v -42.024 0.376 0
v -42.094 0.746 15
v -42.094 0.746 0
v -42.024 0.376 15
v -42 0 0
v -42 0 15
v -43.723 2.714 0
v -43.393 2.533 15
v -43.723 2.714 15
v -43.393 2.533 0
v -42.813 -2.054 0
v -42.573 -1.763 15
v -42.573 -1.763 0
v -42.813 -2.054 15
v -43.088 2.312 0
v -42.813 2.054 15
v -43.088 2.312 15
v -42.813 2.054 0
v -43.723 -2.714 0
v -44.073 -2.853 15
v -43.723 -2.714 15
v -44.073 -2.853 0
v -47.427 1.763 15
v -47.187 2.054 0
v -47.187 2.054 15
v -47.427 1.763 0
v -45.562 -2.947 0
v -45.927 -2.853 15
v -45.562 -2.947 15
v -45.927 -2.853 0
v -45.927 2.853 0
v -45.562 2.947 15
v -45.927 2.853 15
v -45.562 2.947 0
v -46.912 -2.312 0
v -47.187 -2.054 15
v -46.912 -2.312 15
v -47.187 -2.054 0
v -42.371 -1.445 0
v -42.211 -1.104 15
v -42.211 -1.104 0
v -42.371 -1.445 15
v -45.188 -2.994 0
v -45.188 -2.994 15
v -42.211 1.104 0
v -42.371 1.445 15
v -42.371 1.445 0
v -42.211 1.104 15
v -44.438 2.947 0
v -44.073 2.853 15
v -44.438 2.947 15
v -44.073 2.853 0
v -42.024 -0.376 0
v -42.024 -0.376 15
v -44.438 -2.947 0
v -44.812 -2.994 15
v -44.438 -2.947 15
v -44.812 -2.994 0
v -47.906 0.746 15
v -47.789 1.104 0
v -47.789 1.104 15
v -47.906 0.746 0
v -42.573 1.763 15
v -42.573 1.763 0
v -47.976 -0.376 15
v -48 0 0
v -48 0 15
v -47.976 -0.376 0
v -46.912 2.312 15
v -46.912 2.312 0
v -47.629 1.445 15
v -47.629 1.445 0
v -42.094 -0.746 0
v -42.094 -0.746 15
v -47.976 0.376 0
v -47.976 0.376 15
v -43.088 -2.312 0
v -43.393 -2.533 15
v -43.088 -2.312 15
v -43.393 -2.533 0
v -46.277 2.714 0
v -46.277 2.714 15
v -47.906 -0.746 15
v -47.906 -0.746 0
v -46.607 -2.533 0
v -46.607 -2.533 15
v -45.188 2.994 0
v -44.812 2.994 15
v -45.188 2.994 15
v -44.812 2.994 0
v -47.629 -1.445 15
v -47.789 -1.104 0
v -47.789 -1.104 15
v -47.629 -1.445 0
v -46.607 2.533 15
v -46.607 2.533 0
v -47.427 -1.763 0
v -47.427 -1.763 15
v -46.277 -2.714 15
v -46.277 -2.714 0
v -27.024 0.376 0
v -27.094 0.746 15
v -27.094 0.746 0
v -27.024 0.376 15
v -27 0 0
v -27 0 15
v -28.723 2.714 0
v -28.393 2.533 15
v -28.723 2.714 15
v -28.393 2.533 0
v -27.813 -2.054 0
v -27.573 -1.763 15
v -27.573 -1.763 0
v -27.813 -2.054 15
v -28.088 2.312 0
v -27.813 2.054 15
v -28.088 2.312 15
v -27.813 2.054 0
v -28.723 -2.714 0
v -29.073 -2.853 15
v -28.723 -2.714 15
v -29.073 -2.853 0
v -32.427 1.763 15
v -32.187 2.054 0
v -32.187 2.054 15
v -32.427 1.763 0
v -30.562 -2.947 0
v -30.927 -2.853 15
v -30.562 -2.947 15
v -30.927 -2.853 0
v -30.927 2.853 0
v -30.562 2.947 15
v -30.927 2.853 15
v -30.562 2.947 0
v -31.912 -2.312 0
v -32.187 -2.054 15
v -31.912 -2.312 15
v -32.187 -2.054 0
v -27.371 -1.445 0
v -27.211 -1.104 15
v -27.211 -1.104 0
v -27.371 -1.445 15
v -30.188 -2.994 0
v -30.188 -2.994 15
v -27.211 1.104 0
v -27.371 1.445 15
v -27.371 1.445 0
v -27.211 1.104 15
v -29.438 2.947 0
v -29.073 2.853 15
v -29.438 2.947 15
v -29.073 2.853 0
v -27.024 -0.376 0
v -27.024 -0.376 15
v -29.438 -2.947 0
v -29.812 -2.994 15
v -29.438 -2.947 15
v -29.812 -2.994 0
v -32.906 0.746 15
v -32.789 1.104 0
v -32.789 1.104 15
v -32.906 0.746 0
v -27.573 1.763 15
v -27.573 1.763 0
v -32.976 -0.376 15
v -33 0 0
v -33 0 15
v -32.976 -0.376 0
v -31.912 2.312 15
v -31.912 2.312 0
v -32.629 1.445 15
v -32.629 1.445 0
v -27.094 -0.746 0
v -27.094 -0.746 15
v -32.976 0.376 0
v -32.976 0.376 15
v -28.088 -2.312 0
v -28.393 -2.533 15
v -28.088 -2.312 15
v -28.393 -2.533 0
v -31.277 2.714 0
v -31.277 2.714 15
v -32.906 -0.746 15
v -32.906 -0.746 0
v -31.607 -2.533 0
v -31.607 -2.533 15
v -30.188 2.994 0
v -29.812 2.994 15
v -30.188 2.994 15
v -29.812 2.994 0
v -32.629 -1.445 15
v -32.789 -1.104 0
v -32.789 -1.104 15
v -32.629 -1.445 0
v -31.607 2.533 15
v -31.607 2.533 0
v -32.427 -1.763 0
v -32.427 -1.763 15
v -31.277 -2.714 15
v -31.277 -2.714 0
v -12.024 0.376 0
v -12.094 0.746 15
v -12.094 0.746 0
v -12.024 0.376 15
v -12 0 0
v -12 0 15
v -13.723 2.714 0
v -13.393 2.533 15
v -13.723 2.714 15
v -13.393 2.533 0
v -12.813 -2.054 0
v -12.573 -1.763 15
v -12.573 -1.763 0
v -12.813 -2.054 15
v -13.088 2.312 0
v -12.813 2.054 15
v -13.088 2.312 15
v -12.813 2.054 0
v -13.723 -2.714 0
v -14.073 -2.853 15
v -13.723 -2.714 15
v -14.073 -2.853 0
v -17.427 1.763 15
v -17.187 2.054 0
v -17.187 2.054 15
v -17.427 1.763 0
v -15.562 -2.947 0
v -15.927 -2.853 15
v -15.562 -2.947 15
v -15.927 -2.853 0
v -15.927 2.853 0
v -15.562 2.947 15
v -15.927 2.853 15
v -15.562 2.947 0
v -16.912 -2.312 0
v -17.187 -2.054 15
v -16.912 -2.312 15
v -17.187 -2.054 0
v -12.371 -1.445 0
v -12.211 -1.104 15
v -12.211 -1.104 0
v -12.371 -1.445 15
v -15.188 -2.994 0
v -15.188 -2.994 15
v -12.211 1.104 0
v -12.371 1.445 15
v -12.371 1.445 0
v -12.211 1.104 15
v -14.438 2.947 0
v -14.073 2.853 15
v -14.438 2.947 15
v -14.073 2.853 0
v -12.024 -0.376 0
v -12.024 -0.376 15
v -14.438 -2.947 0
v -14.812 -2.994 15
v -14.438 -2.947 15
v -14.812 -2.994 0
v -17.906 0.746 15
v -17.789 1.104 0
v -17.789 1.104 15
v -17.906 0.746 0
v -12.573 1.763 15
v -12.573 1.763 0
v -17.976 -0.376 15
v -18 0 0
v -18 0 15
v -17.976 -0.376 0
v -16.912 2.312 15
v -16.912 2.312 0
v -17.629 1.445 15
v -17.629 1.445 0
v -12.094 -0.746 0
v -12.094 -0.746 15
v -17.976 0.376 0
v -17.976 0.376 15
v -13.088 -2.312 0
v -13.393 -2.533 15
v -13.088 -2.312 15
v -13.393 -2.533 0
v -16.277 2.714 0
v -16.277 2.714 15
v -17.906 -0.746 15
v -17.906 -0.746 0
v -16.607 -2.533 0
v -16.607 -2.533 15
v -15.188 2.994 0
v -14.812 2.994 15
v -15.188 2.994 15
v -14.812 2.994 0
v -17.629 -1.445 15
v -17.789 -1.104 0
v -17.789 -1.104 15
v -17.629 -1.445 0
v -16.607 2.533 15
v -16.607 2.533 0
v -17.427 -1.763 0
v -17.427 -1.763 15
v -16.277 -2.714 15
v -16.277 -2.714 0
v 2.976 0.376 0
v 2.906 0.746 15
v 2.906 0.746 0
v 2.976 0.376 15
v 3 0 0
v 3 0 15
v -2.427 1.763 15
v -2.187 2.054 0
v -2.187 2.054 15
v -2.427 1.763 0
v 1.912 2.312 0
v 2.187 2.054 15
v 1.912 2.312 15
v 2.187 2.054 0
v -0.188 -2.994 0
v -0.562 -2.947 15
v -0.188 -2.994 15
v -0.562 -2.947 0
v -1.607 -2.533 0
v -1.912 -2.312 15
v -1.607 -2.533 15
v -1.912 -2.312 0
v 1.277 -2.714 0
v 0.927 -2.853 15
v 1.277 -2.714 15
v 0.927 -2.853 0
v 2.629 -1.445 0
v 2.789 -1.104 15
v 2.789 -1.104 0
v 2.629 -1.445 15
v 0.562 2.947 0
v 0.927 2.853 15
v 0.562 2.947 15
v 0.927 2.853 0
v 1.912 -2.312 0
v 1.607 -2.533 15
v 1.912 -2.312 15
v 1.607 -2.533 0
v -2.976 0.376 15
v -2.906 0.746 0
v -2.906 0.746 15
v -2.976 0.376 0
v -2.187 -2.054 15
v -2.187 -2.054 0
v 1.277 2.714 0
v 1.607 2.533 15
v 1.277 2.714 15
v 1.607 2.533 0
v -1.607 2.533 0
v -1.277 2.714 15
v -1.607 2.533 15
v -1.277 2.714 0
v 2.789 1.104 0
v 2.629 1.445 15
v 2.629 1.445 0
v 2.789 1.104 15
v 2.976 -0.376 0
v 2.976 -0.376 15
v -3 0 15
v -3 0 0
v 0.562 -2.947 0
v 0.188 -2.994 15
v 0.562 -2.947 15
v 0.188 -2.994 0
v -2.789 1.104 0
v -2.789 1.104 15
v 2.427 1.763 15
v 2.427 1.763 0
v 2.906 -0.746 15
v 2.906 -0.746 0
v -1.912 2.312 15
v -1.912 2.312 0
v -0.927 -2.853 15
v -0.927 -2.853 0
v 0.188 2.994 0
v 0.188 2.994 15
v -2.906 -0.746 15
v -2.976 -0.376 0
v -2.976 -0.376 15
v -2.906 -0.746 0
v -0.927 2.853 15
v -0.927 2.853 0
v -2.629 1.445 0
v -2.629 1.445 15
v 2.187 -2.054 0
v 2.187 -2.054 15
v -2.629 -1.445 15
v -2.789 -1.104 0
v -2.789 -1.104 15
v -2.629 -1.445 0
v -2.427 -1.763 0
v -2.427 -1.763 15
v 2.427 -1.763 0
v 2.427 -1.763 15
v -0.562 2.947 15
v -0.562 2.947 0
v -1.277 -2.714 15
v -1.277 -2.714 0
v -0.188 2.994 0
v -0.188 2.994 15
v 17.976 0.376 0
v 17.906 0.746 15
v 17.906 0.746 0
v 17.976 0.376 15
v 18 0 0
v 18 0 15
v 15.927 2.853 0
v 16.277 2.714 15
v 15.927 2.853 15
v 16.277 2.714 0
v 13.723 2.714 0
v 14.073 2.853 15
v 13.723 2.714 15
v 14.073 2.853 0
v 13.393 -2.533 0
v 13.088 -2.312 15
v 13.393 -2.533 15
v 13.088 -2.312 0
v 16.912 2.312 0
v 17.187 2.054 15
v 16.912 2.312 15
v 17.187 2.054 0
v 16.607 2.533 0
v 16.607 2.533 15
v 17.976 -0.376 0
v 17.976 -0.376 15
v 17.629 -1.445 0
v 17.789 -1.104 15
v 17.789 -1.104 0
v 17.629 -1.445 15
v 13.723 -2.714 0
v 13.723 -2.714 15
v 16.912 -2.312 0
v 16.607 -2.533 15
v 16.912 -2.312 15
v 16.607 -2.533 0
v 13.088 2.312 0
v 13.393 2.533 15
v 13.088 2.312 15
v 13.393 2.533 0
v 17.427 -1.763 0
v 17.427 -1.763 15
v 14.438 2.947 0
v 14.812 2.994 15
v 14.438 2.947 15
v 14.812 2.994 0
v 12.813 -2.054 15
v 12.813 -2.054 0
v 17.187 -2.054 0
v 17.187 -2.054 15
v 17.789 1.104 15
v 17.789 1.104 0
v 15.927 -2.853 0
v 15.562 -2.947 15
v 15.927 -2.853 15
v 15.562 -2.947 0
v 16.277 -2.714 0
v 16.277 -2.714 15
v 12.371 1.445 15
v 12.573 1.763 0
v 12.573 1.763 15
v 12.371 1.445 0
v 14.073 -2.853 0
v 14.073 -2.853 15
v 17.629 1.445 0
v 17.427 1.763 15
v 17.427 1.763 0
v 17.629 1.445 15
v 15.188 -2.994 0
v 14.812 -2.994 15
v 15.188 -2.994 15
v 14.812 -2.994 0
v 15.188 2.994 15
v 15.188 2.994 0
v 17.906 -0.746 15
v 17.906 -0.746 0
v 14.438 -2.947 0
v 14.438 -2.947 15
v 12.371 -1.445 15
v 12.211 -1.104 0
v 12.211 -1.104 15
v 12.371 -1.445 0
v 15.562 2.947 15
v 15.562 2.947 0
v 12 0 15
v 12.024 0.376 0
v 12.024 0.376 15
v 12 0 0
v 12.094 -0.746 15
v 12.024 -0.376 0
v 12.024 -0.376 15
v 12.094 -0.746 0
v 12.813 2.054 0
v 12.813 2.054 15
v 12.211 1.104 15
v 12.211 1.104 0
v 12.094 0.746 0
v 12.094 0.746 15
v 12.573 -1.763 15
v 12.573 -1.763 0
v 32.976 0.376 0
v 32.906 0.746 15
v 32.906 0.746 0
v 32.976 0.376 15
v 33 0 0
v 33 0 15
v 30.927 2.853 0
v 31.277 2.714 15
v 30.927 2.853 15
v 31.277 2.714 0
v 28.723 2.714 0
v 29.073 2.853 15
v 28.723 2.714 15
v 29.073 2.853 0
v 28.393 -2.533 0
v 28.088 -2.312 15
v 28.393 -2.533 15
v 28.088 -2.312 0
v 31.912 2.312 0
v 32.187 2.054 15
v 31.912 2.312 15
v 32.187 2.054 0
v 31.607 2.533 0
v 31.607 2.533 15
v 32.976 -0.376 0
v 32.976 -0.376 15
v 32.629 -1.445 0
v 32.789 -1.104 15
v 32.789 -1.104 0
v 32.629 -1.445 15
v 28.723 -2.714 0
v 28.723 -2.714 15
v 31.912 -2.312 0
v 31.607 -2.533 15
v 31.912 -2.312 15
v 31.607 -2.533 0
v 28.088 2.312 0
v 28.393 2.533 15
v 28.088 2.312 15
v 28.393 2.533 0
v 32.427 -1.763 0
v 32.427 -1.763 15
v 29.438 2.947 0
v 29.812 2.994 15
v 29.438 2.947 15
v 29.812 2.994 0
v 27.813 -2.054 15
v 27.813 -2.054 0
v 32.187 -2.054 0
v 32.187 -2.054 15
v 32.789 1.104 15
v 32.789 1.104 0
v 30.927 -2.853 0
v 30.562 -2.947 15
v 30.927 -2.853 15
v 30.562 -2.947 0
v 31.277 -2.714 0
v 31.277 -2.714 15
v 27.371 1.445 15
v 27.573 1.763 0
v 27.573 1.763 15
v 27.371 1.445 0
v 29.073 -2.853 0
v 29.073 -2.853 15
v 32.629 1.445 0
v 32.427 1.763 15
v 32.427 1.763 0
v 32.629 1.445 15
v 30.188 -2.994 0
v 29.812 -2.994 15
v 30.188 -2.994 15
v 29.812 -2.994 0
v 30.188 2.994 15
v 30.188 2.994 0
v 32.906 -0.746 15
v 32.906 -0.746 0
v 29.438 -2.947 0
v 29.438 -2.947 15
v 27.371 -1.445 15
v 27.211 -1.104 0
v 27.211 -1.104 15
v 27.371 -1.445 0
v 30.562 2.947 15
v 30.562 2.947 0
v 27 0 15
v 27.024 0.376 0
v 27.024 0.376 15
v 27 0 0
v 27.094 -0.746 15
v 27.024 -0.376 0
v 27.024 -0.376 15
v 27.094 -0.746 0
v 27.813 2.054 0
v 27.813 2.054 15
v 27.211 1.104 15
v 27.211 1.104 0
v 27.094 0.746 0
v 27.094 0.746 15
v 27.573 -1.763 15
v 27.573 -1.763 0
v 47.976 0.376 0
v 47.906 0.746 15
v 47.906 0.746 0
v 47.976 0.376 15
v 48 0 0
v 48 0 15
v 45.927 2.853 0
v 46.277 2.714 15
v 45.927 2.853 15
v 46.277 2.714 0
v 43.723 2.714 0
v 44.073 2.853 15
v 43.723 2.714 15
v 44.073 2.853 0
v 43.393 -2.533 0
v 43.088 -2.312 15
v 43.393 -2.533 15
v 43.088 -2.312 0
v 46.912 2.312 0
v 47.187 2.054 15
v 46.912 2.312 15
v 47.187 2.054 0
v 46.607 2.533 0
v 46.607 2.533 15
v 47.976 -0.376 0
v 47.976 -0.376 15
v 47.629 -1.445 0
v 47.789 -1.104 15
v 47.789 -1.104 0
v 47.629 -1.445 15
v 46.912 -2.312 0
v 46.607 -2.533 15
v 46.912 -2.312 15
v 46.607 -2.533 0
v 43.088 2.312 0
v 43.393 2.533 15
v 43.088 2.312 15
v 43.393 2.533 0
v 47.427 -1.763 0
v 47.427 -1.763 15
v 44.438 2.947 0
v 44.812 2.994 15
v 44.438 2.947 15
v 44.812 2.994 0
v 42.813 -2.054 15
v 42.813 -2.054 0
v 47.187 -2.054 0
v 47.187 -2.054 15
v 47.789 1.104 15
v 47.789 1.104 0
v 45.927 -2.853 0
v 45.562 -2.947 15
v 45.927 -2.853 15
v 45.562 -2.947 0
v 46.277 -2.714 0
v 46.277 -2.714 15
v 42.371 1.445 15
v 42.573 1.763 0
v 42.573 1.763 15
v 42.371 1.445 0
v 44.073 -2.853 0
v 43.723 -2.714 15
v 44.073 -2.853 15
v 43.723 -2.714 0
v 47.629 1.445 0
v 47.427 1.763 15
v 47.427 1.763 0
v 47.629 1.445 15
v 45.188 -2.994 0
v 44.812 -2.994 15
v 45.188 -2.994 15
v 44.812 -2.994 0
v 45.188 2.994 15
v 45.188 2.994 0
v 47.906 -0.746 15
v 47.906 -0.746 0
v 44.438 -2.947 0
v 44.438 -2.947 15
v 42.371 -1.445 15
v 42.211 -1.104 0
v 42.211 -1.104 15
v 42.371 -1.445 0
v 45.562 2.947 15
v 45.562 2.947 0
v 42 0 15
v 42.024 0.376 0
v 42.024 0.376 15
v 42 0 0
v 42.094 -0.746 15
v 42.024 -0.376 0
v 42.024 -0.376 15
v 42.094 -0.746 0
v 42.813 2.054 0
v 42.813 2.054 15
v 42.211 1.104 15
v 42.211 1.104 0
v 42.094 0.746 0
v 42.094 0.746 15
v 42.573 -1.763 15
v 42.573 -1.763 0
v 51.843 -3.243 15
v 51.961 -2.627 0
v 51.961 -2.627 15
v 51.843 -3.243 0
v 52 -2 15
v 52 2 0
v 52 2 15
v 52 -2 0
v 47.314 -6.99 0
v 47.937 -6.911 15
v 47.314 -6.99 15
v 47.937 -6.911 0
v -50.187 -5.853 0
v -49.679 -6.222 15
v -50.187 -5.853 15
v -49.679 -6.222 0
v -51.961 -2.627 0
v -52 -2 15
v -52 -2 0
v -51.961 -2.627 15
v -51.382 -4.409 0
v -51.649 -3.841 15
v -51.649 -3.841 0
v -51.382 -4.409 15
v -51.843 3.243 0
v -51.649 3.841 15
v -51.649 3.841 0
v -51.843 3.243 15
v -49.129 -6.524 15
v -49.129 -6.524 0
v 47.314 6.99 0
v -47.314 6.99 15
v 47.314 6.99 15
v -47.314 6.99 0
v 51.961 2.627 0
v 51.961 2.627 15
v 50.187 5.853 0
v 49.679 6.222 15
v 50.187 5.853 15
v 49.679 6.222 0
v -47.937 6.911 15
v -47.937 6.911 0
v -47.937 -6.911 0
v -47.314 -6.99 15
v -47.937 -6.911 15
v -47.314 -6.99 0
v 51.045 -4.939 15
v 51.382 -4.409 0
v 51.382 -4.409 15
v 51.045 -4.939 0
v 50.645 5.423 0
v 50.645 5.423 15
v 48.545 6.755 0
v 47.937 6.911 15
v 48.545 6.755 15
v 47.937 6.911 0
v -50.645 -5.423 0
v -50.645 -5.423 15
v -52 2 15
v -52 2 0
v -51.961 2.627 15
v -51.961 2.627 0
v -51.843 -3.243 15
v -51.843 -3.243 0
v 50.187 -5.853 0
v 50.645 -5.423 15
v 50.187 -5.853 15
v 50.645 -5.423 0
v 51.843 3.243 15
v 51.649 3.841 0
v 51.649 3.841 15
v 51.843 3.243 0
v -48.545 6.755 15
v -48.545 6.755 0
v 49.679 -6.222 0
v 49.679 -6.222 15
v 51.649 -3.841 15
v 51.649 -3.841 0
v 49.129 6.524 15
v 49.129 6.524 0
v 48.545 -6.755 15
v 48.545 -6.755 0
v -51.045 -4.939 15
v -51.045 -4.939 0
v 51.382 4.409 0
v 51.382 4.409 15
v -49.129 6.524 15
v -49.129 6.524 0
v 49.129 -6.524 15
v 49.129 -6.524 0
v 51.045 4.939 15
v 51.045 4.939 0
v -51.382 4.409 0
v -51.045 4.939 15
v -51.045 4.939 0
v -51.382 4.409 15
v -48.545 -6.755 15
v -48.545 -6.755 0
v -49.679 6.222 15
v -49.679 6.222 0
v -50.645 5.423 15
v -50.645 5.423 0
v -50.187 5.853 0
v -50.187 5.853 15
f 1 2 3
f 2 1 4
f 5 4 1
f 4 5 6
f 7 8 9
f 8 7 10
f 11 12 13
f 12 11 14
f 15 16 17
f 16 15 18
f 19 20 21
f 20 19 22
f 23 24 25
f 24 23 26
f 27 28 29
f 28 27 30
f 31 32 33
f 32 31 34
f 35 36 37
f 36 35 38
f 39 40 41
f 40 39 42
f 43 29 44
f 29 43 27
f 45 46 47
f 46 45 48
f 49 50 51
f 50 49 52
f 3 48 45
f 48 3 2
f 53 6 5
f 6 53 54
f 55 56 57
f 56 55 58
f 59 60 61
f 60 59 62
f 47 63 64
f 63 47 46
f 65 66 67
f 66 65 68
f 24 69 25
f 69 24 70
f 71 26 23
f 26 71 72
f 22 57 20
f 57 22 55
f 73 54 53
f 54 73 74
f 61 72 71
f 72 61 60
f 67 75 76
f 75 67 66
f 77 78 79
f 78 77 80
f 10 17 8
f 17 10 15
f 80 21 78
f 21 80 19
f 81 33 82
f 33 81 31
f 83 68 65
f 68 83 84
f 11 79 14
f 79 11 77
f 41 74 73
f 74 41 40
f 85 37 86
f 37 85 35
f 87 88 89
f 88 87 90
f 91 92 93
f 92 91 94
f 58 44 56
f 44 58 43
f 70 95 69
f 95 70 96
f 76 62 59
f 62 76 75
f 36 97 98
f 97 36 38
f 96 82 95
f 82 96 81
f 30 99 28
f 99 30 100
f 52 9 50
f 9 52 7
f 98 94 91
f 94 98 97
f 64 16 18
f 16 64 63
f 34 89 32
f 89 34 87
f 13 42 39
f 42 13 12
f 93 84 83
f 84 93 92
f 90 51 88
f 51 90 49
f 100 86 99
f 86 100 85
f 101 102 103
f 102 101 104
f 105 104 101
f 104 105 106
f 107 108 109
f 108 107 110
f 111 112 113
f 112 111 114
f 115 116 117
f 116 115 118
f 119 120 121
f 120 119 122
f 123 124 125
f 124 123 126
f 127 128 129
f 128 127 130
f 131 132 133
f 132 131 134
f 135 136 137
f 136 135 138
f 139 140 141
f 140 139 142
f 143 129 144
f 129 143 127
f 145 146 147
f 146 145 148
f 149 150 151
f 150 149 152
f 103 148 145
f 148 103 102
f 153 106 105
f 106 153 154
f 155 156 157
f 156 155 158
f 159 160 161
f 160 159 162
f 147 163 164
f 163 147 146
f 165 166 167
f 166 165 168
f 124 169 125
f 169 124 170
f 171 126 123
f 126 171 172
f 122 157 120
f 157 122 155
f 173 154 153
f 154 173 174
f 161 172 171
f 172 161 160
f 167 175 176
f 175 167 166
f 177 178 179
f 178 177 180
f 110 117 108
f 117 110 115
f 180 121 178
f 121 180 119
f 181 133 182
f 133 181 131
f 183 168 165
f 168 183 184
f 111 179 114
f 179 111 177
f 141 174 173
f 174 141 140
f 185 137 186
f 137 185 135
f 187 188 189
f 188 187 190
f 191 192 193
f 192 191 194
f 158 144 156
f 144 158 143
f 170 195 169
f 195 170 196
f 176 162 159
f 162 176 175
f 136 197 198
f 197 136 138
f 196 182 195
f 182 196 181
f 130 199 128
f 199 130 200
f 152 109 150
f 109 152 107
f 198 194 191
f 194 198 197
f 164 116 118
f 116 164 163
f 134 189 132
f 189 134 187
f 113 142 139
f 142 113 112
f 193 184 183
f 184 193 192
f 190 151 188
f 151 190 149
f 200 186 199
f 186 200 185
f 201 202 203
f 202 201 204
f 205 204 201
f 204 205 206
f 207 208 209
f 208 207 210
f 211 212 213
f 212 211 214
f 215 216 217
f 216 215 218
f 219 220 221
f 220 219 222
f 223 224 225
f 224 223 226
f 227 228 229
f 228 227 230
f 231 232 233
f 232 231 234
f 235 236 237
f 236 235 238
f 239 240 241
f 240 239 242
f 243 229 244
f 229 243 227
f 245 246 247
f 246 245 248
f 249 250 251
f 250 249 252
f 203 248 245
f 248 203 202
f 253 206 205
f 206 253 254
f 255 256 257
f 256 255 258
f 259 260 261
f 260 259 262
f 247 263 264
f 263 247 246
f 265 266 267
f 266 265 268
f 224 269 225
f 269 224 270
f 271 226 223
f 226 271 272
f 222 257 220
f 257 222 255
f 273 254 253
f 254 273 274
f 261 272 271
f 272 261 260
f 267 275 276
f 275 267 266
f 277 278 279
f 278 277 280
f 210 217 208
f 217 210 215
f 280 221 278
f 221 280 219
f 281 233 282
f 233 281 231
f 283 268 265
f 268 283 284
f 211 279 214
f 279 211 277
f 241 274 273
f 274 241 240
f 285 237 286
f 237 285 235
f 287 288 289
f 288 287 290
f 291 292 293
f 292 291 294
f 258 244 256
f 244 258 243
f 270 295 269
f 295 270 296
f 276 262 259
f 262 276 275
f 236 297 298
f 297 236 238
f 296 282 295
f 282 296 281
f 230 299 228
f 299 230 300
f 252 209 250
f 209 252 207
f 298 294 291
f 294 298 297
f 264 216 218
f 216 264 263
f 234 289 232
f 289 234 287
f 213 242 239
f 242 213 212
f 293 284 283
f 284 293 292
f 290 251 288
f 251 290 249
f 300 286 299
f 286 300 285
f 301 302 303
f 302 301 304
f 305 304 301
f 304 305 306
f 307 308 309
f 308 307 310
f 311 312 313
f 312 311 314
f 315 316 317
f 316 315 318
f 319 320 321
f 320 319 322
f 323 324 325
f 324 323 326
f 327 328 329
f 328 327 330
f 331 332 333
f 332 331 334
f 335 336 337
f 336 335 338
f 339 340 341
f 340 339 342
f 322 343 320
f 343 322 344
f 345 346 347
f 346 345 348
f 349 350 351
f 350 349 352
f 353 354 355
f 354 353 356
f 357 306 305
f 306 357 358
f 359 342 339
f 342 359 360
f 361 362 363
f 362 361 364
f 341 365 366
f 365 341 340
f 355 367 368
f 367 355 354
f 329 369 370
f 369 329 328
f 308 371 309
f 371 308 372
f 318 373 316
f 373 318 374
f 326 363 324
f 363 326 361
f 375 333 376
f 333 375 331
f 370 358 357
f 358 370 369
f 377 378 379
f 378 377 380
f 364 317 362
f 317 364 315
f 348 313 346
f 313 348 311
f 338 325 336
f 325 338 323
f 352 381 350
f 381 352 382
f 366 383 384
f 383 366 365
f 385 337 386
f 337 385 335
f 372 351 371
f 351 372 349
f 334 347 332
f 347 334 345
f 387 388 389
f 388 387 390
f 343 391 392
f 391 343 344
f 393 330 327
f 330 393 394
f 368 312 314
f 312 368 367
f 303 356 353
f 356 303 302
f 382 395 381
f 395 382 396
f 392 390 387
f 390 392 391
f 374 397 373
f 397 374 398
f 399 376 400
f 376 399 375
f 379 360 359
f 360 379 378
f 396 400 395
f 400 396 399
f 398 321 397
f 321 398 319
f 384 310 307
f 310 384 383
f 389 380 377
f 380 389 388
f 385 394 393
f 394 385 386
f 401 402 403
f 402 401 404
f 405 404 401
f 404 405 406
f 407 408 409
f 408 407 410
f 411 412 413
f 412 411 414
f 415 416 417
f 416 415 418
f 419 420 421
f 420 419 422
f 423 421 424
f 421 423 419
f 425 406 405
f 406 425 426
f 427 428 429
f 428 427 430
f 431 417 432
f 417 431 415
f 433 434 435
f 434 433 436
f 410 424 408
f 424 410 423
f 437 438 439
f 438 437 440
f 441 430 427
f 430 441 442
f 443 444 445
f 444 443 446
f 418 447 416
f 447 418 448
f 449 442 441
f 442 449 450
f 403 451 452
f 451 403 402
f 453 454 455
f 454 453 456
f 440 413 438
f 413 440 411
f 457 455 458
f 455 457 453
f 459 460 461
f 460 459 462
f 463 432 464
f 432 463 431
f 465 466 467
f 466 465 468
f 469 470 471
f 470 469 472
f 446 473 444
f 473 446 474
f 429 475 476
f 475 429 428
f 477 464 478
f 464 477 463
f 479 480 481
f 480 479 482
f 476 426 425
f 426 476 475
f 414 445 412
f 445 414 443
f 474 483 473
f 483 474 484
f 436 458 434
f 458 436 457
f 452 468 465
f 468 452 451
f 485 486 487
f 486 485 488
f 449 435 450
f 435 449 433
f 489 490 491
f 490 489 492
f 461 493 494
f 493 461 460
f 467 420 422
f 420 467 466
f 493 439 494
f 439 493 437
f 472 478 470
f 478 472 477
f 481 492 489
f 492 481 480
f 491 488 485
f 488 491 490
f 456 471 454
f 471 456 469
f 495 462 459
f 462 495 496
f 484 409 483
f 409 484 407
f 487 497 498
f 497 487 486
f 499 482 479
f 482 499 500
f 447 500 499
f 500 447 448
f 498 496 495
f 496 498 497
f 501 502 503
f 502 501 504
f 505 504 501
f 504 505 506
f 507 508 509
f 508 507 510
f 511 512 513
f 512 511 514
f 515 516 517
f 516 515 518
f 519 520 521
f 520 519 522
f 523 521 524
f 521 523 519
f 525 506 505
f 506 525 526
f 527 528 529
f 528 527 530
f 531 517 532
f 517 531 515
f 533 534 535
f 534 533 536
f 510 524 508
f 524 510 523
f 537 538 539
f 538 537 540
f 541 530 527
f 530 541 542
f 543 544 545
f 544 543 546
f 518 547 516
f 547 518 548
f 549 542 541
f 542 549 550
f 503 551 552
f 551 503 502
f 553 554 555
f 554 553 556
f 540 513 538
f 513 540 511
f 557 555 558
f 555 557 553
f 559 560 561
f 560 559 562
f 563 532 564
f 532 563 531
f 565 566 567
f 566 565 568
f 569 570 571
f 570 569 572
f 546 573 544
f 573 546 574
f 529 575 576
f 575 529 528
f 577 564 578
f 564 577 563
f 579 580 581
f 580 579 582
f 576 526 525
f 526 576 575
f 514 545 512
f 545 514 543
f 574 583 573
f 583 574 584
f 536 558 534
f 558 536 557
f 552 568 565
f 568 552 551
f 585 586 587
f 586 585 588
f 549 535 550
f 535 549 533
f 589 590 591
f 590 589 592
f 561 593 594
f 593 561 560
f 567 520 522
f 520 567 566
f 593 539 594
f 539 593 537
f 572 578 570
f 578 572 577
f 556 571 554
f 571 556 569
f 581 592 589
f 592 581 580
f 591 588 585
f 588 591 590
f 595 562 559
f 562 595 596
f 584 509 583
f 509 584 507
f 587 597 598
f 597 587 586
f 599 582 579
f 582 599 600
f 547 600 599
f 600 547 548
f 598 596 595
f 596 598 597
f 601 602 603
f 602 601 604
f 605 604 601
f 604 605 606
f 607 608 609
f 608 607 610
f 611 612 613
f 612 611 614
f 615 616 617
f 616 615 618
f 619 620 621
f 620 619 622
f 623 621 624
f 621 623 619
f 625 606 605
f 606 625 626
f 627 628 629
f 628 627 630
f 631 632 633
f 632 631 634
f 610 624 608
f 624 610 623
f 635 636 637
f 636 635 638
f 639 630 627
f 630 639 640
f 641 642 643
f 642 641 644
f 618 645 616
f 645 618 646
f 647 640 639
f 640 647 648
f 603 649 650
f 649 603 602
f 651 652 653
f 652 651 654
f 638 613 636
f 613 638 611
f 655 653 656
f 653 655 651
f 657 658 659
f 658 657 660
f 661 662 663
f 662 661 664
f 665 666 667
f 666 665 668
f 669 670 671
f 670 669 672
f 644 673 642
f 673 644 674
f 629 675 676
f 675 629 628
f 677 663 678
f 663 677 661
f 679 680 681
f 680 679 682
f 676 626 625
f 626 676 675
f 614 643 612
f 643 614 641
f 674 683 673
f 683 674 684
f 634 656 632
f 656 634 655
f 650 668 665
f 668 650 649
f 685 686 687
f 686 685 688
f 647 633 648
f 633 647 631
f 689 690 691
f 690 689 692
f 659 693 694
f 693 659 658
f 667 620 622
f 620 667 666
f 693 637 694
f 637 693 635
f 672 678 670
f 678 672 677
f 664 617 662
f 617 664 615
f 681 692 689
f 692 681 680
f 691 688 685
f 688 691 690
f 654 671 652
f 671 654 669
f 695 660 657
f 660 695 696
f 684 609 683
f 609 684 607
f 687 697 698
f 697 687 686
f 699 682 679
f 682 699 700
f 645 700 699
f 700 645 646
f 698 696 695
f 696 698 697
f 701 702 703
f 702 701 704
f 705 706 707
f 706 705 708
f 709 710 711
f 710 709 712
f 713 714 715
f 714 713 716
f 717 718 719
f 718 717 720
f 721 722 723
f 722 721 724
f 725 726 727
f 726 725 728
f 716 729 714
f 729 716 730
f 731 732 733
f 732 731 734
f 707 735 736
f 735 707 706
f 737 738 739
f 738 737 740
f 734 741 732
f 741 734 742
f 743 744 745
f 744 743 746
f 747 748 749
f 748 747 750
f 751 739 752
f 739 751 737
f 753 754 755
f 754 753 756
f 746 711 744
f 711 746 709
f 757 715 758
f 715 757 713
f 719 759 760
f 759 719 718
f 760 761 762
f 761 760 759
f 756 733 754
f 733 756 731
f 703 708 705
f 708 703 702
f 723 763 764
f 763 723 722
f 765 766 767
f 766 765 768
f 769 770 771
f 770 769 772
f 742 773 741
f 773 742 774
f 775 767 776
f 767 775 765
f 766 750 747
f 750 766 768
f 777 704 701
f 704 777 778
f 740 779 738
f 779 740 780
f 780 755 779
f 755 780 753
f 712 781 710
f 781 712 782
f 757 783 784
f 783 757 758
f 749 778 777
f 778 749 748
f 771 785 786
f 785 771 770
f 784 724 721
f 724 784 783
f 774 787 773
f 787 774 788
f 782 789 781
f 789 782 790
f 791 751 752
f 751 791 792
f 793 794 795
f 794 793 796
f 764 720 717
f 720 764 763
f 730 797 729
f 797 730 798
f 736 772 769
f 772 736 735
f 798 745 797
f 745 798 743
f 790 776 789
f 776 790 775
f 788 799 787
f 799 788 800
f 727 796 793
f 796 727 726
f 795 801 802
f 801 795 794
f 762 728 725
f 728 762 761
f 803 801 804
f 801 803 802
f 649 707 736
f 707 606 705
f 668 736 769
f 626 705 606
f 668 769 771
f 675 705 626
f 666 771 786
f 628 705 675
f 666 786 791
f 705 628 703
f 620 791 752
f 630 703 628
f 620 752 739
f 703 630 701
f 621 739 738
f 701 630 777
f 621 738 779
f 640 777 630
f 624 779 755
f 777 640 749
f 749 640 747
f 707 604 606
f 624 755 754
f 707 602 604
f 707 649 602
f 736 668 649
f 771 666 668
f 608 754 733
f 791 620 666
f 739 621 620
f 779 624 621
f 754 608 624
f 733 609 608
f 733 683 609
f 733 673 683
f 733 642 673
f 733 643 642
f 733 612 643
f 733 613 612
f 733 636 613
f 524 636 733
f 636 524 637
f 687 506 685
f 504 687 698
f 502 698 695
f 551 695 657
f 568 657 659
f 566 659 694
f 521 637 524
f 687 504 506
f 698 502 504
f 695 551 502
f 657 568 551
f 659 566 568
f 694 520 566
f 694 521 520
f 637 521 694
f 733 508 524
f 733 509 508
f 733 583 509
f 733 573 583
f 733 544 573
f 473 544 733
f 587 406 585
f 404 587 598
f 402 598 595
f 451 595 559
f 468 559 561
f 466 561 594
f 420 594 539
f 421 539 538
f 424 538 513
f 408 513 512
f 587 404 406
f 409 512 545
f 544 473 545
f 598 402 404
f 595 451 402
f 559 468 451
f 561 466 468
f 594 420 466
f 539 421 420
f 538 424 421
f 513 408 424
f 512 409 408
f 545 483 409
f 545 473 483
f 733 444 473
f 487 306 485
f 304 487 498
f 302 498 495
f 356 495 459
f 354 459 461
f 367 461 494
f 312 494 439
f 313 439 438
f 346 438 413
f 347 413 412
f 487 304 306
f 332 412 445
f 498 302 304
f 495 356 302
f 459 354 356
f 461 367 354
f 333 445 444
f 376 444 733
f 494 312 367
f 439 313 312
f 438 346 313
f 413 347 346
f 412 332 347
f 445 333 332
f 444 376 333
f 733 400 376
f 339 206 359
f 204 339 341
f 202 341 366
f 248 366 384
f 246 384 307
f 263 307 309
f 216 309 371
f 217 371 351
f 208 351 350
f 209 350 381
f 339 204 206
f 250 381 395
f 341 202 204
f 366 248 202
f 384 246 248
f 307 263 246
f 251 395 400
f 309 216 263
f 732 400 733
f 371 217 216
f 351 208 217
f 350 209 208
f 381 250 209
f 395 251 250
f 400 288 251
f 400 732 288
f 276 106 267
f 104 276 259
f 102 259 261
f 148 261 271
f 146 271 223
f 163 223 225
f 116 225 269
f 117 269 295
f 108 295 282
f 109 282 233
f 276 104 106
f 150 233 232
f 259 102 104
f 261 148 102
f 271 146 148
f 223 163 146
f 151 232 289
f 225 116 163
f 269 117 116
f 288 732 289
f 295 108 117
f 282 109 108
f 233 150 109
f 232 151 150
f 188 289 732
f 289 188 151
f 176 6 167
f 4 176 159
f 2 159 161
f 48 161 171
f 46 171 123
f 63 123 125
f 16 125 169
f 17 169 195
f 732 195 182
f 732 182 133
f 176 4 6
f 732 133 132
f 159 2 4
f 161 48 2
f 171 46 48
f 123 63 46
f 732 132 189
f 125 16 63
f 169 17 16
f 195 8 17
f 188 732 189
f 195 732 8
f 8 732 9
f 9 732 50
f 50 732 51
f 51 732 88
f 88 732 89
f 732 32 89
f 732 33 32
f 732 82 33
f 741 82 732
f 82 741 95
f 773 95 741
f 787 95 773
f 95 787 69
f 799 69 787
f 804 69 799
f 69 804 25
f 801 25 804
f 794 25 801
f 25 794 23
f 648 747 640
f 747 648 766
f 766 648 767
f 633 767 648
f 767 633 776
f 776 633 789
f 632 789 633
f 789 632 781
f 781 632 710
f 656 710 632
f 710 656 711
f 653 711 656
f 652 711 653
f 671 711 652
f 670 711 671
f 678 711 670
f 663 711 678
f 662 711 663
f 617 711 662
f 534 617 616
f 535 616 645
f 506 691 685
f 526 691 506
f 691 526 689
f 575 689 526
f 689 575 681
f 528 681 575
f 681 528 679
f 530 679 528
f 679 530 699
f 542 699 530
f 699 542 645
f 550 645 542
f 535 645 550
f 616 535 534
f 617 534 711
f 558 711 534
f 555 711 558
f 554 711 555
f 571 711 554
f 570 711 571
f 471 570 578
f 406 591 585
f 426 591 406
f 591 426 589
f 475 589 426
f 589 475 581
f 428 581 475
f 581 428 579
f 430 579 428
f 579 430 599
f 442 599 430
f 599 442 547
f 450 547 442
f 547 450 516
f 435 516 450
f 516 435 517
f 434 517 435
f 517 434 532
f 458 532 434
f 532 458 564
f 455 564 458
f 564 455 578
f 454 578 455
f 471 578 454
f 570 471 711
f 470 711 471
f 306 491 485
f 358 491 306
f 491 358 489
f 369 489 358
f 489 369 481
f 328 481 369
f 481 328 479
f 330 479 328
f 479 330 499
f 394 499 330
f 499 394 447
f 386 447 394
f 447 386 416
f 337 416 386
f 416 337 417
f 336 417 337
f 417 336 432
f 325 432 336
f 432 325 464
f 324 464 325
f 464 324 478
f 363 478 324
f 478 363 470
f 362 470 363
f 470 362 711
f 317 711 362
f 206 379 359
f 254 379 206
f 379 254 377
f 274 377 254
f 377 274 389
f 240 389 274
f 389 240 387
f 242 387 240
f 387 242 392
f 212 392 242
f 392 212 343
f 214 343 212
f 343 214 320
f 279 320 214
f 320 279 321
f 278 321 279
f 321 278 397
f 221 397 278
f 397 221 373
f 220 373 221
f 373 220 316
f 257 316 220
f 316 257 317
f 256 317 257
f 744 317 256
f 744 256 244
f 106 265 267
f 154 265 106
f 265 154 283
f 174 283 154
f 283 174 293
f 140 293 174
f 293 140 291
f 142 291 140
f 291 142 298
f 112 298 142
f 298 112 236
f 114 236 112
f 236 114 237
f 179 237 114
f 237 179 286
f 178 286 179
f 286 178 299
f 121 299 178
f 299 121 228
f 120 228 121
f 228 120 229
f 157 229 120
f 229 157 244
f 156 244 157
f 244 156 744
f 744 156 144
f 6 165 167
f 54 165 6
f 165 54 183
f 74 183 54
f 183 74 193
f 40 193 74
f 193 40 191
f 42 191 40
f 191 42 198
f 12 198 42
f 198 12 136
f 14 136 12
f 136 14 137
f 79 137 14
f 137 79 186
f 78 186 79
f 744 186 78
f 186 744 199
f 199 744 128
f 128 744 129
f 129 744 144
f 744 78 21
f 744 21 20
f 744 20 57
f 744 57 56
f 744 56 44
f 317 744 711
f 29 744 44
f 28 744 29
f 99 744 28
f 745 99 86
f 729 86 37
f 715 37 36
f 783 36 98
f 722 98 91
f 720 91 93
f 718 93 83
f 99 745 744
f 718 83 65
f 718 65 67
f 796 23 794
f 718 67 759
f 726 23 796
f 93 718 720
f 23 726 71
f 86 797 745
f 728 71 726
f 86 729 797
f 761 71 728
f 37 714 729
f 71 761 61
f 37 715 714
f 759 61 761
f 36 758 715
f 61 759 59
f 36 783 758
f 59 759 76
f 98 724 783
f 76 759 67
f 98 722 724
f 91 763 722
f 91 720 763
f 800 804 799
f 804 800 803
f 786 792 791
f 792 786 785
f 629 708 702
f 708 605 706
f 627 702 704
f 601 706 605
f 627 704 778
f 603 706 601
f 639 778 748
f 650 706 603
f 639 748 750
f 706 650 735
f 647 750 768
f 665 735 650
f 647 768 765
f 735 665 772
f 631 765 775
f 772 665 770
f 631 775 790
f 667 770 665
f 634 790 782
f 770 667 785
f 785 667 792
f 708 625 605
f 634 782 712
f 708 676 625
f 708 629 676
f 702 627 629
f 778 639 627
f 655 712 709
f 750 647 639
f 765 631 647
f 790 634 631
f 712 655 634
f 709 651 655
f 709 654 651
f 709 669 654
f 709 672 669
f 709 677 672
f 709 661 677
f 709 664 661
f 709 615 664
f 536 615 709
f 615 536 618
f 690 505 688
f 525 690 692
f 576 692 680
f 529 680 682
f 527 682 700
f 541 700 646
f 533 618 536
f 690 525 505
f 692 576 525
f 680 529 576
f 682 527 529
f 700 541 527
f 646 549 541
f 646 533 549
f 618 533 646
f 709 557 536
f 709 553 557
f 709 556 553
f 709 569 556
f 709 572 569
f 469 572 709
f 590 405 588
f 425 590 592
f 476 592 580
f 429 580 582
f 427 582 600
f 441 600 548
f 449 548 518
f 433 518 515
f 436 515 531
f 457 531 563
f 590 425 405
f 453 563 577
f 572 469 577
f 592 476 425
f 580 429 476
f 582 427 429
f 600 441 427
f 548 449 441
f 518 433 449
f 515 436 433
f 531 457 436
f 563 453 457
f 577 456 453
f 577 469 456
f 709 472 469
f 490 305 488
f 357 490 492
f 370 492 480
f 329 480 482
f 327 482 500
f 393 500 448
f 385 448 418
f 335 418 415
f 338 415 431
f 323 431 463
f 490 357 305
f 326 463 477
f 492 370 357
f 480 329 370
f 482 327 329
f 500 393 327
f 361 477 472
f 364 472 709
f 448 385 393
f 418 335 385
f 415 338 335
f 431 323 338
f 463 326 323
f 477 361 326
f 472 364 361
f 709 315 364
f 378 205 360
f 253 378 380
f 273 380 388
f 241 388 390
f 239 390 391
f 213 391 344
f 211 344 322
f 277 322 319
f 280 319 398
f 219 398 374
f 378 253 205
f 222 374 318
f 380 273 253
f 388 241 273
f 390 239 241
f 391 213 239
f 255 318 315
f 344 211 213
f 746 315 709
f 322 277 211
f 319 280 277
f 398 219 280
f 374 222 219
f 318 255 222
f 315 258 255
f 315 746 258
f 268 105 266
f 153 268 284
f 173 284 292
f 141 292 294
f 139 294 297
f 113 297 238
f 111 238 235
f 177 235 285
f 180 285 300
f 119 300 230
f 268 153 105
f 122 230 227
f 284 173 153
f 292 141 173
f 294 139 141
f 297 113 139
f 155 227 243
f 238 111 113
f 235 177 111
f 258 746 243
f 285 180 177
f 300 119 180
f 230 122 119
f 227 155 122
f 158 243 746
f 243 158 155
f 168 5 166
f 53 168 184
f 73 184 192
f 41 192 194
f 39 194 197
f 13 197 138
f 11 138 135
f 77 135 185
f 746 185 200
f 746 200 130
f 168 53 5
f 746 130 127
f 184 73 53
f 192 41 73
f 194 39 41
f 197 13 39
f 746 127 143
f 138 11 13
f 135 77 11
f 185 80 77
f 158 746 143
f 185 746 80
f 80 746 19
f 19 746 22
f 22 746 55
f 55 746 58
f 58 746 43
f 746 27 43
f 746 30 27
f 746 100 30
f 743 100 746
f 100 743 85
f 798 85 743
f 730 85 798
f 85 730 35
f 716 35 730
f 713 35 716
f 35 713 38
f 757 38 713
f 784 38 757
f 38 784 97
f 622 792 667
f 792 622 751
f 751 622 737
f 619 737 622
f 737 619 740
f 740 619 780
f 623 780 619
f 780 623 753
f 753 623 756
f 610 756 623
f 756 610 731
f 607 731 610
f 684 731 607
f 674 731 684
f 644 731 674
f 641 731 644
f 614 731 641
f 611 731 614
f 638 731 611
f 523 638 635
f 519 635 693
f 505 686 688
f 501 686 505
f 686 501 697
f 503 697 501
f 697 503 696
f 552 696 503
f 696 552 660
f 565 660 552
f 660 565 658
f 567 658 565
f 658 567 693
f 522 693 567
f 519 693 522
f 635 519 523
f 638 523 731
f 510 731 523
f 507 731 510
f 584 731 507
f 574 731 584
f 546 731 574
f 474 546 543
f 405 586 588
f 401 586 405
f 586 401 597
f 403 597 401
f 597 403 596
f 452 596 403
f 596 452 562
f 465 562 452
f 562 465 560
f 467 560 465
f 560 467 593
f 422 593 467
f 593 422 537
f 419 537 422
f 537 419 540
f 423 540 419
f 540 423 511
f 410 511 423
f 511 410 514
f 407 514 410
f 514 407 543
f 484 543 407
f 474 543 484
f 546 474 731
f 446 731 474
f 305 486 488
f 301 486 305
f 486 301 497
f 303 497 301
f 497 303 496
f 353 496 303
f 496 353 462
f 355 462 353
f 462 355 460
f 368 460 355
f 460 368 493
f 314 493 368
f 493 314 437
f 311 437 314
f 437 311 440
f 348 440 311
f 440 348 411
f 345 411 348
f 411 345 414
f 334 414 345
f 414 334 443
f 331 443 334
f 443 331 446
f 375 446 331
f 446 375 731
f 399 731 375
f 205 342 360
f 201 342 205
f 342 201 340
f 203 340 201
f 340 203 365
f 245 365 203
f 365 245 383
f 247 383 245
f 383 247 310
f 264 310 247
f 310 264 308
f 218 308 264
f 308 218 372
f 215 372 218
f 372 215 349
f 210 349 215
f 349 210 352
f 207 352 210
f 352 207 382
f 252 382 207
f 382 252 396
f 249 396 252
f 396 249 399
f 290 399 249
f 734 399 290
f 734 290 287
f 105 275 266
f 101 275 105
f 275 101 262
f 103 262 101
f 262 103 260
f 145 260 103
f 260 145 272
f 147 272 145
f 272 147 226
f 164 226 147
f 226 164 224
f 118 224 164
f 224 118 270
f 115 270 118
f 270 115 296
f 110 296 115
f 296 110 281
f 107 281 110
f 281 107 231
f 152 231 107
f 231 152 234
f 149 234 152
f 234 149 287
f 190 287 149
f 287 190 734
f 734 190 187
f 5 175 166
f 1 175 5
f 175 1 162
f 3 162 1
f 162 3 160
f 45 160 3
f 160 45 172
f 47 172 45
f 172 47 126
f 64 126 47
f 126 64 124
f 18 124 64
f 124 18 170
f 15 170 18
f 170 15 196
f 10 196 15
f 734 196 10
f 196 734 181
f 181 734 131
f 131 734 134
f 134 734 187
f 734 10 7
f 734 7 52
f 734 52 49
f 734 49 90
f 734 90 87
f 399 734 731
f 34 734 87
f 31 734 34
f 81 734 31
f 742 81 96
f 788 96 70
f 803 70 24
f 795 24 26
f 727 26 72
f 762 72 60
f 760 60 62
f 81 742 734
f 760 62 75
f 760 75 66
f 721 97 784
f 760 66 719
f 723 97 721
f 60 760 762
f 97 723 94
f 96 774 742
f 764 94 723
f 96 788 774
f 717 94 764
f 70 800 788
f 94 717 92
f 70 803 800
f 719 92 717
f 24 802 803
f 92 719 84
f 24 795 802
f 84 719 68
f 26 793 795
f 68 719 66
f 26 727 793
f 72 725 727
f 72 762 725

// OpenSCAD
$fn = 50;


difference() {
	union() {
		hull() {
			translate(v = [-47.0000000000, 2.0000000000, 0]) {
				cylinder(h = 15, r = 5);
			}
			translate(v = [47.0000000000, 2.0000000000, 0]) {
				cylinder(h = 15, r = 5);
			}
			translate(v = [-47.0000000000, -2.0000000000, 0]) {
				cylinder(h = 15, r = 5);
			}
			translate(v = [47.0000000000, -2.0000000000, 0]) {
				cylinder(h = 15, r = 5);
			}
		}
	}
	union() {
		translate(v = [-45.0000000000, 0.0000000000, 0]) {
			translate(v = [0, 0, -100]) {
				cylinder(h = 200, r = 3.0000000000);
			}
		}
		translate(v = [-30.0000000000, 0.0000000000, 0]) {
			translate(v = [0, 0, -100]) {
				cylinder(h = 200, r = 3.0000000000);
			}
		}
		translate(v = [-15.0000000000, 0.0000000000, 0]) {
			translate(v = [0, 0, -100]) {
				cylinder(h = 200, r = 3.0000000000);
			}
		}
		translate(v = [0, 0, -100]) {
			cylinder(h = 200, r = 3.0000000000);
		}
		translate(v = [15.0000000000, 0.0000000000, 0]) {
			translate(v = [0, 0, -100]) {
				cylinder(h = 200, r = 3.0000000000);
			}
		}
		translate(v = [30.0000000000, 0.0000000000, 0]) {
			translate(v = [0, 0, -100]) {
				cylinder(h = 200, r = 3.0000000000);
			}
		}
		translate(v = [45.0000000000, 0.0000000000, 0]) {
			translate(v = [0, 0, -100]) {
				cylinder(h = 200, r = 3.0000000000);
			}
		}
	}
}
